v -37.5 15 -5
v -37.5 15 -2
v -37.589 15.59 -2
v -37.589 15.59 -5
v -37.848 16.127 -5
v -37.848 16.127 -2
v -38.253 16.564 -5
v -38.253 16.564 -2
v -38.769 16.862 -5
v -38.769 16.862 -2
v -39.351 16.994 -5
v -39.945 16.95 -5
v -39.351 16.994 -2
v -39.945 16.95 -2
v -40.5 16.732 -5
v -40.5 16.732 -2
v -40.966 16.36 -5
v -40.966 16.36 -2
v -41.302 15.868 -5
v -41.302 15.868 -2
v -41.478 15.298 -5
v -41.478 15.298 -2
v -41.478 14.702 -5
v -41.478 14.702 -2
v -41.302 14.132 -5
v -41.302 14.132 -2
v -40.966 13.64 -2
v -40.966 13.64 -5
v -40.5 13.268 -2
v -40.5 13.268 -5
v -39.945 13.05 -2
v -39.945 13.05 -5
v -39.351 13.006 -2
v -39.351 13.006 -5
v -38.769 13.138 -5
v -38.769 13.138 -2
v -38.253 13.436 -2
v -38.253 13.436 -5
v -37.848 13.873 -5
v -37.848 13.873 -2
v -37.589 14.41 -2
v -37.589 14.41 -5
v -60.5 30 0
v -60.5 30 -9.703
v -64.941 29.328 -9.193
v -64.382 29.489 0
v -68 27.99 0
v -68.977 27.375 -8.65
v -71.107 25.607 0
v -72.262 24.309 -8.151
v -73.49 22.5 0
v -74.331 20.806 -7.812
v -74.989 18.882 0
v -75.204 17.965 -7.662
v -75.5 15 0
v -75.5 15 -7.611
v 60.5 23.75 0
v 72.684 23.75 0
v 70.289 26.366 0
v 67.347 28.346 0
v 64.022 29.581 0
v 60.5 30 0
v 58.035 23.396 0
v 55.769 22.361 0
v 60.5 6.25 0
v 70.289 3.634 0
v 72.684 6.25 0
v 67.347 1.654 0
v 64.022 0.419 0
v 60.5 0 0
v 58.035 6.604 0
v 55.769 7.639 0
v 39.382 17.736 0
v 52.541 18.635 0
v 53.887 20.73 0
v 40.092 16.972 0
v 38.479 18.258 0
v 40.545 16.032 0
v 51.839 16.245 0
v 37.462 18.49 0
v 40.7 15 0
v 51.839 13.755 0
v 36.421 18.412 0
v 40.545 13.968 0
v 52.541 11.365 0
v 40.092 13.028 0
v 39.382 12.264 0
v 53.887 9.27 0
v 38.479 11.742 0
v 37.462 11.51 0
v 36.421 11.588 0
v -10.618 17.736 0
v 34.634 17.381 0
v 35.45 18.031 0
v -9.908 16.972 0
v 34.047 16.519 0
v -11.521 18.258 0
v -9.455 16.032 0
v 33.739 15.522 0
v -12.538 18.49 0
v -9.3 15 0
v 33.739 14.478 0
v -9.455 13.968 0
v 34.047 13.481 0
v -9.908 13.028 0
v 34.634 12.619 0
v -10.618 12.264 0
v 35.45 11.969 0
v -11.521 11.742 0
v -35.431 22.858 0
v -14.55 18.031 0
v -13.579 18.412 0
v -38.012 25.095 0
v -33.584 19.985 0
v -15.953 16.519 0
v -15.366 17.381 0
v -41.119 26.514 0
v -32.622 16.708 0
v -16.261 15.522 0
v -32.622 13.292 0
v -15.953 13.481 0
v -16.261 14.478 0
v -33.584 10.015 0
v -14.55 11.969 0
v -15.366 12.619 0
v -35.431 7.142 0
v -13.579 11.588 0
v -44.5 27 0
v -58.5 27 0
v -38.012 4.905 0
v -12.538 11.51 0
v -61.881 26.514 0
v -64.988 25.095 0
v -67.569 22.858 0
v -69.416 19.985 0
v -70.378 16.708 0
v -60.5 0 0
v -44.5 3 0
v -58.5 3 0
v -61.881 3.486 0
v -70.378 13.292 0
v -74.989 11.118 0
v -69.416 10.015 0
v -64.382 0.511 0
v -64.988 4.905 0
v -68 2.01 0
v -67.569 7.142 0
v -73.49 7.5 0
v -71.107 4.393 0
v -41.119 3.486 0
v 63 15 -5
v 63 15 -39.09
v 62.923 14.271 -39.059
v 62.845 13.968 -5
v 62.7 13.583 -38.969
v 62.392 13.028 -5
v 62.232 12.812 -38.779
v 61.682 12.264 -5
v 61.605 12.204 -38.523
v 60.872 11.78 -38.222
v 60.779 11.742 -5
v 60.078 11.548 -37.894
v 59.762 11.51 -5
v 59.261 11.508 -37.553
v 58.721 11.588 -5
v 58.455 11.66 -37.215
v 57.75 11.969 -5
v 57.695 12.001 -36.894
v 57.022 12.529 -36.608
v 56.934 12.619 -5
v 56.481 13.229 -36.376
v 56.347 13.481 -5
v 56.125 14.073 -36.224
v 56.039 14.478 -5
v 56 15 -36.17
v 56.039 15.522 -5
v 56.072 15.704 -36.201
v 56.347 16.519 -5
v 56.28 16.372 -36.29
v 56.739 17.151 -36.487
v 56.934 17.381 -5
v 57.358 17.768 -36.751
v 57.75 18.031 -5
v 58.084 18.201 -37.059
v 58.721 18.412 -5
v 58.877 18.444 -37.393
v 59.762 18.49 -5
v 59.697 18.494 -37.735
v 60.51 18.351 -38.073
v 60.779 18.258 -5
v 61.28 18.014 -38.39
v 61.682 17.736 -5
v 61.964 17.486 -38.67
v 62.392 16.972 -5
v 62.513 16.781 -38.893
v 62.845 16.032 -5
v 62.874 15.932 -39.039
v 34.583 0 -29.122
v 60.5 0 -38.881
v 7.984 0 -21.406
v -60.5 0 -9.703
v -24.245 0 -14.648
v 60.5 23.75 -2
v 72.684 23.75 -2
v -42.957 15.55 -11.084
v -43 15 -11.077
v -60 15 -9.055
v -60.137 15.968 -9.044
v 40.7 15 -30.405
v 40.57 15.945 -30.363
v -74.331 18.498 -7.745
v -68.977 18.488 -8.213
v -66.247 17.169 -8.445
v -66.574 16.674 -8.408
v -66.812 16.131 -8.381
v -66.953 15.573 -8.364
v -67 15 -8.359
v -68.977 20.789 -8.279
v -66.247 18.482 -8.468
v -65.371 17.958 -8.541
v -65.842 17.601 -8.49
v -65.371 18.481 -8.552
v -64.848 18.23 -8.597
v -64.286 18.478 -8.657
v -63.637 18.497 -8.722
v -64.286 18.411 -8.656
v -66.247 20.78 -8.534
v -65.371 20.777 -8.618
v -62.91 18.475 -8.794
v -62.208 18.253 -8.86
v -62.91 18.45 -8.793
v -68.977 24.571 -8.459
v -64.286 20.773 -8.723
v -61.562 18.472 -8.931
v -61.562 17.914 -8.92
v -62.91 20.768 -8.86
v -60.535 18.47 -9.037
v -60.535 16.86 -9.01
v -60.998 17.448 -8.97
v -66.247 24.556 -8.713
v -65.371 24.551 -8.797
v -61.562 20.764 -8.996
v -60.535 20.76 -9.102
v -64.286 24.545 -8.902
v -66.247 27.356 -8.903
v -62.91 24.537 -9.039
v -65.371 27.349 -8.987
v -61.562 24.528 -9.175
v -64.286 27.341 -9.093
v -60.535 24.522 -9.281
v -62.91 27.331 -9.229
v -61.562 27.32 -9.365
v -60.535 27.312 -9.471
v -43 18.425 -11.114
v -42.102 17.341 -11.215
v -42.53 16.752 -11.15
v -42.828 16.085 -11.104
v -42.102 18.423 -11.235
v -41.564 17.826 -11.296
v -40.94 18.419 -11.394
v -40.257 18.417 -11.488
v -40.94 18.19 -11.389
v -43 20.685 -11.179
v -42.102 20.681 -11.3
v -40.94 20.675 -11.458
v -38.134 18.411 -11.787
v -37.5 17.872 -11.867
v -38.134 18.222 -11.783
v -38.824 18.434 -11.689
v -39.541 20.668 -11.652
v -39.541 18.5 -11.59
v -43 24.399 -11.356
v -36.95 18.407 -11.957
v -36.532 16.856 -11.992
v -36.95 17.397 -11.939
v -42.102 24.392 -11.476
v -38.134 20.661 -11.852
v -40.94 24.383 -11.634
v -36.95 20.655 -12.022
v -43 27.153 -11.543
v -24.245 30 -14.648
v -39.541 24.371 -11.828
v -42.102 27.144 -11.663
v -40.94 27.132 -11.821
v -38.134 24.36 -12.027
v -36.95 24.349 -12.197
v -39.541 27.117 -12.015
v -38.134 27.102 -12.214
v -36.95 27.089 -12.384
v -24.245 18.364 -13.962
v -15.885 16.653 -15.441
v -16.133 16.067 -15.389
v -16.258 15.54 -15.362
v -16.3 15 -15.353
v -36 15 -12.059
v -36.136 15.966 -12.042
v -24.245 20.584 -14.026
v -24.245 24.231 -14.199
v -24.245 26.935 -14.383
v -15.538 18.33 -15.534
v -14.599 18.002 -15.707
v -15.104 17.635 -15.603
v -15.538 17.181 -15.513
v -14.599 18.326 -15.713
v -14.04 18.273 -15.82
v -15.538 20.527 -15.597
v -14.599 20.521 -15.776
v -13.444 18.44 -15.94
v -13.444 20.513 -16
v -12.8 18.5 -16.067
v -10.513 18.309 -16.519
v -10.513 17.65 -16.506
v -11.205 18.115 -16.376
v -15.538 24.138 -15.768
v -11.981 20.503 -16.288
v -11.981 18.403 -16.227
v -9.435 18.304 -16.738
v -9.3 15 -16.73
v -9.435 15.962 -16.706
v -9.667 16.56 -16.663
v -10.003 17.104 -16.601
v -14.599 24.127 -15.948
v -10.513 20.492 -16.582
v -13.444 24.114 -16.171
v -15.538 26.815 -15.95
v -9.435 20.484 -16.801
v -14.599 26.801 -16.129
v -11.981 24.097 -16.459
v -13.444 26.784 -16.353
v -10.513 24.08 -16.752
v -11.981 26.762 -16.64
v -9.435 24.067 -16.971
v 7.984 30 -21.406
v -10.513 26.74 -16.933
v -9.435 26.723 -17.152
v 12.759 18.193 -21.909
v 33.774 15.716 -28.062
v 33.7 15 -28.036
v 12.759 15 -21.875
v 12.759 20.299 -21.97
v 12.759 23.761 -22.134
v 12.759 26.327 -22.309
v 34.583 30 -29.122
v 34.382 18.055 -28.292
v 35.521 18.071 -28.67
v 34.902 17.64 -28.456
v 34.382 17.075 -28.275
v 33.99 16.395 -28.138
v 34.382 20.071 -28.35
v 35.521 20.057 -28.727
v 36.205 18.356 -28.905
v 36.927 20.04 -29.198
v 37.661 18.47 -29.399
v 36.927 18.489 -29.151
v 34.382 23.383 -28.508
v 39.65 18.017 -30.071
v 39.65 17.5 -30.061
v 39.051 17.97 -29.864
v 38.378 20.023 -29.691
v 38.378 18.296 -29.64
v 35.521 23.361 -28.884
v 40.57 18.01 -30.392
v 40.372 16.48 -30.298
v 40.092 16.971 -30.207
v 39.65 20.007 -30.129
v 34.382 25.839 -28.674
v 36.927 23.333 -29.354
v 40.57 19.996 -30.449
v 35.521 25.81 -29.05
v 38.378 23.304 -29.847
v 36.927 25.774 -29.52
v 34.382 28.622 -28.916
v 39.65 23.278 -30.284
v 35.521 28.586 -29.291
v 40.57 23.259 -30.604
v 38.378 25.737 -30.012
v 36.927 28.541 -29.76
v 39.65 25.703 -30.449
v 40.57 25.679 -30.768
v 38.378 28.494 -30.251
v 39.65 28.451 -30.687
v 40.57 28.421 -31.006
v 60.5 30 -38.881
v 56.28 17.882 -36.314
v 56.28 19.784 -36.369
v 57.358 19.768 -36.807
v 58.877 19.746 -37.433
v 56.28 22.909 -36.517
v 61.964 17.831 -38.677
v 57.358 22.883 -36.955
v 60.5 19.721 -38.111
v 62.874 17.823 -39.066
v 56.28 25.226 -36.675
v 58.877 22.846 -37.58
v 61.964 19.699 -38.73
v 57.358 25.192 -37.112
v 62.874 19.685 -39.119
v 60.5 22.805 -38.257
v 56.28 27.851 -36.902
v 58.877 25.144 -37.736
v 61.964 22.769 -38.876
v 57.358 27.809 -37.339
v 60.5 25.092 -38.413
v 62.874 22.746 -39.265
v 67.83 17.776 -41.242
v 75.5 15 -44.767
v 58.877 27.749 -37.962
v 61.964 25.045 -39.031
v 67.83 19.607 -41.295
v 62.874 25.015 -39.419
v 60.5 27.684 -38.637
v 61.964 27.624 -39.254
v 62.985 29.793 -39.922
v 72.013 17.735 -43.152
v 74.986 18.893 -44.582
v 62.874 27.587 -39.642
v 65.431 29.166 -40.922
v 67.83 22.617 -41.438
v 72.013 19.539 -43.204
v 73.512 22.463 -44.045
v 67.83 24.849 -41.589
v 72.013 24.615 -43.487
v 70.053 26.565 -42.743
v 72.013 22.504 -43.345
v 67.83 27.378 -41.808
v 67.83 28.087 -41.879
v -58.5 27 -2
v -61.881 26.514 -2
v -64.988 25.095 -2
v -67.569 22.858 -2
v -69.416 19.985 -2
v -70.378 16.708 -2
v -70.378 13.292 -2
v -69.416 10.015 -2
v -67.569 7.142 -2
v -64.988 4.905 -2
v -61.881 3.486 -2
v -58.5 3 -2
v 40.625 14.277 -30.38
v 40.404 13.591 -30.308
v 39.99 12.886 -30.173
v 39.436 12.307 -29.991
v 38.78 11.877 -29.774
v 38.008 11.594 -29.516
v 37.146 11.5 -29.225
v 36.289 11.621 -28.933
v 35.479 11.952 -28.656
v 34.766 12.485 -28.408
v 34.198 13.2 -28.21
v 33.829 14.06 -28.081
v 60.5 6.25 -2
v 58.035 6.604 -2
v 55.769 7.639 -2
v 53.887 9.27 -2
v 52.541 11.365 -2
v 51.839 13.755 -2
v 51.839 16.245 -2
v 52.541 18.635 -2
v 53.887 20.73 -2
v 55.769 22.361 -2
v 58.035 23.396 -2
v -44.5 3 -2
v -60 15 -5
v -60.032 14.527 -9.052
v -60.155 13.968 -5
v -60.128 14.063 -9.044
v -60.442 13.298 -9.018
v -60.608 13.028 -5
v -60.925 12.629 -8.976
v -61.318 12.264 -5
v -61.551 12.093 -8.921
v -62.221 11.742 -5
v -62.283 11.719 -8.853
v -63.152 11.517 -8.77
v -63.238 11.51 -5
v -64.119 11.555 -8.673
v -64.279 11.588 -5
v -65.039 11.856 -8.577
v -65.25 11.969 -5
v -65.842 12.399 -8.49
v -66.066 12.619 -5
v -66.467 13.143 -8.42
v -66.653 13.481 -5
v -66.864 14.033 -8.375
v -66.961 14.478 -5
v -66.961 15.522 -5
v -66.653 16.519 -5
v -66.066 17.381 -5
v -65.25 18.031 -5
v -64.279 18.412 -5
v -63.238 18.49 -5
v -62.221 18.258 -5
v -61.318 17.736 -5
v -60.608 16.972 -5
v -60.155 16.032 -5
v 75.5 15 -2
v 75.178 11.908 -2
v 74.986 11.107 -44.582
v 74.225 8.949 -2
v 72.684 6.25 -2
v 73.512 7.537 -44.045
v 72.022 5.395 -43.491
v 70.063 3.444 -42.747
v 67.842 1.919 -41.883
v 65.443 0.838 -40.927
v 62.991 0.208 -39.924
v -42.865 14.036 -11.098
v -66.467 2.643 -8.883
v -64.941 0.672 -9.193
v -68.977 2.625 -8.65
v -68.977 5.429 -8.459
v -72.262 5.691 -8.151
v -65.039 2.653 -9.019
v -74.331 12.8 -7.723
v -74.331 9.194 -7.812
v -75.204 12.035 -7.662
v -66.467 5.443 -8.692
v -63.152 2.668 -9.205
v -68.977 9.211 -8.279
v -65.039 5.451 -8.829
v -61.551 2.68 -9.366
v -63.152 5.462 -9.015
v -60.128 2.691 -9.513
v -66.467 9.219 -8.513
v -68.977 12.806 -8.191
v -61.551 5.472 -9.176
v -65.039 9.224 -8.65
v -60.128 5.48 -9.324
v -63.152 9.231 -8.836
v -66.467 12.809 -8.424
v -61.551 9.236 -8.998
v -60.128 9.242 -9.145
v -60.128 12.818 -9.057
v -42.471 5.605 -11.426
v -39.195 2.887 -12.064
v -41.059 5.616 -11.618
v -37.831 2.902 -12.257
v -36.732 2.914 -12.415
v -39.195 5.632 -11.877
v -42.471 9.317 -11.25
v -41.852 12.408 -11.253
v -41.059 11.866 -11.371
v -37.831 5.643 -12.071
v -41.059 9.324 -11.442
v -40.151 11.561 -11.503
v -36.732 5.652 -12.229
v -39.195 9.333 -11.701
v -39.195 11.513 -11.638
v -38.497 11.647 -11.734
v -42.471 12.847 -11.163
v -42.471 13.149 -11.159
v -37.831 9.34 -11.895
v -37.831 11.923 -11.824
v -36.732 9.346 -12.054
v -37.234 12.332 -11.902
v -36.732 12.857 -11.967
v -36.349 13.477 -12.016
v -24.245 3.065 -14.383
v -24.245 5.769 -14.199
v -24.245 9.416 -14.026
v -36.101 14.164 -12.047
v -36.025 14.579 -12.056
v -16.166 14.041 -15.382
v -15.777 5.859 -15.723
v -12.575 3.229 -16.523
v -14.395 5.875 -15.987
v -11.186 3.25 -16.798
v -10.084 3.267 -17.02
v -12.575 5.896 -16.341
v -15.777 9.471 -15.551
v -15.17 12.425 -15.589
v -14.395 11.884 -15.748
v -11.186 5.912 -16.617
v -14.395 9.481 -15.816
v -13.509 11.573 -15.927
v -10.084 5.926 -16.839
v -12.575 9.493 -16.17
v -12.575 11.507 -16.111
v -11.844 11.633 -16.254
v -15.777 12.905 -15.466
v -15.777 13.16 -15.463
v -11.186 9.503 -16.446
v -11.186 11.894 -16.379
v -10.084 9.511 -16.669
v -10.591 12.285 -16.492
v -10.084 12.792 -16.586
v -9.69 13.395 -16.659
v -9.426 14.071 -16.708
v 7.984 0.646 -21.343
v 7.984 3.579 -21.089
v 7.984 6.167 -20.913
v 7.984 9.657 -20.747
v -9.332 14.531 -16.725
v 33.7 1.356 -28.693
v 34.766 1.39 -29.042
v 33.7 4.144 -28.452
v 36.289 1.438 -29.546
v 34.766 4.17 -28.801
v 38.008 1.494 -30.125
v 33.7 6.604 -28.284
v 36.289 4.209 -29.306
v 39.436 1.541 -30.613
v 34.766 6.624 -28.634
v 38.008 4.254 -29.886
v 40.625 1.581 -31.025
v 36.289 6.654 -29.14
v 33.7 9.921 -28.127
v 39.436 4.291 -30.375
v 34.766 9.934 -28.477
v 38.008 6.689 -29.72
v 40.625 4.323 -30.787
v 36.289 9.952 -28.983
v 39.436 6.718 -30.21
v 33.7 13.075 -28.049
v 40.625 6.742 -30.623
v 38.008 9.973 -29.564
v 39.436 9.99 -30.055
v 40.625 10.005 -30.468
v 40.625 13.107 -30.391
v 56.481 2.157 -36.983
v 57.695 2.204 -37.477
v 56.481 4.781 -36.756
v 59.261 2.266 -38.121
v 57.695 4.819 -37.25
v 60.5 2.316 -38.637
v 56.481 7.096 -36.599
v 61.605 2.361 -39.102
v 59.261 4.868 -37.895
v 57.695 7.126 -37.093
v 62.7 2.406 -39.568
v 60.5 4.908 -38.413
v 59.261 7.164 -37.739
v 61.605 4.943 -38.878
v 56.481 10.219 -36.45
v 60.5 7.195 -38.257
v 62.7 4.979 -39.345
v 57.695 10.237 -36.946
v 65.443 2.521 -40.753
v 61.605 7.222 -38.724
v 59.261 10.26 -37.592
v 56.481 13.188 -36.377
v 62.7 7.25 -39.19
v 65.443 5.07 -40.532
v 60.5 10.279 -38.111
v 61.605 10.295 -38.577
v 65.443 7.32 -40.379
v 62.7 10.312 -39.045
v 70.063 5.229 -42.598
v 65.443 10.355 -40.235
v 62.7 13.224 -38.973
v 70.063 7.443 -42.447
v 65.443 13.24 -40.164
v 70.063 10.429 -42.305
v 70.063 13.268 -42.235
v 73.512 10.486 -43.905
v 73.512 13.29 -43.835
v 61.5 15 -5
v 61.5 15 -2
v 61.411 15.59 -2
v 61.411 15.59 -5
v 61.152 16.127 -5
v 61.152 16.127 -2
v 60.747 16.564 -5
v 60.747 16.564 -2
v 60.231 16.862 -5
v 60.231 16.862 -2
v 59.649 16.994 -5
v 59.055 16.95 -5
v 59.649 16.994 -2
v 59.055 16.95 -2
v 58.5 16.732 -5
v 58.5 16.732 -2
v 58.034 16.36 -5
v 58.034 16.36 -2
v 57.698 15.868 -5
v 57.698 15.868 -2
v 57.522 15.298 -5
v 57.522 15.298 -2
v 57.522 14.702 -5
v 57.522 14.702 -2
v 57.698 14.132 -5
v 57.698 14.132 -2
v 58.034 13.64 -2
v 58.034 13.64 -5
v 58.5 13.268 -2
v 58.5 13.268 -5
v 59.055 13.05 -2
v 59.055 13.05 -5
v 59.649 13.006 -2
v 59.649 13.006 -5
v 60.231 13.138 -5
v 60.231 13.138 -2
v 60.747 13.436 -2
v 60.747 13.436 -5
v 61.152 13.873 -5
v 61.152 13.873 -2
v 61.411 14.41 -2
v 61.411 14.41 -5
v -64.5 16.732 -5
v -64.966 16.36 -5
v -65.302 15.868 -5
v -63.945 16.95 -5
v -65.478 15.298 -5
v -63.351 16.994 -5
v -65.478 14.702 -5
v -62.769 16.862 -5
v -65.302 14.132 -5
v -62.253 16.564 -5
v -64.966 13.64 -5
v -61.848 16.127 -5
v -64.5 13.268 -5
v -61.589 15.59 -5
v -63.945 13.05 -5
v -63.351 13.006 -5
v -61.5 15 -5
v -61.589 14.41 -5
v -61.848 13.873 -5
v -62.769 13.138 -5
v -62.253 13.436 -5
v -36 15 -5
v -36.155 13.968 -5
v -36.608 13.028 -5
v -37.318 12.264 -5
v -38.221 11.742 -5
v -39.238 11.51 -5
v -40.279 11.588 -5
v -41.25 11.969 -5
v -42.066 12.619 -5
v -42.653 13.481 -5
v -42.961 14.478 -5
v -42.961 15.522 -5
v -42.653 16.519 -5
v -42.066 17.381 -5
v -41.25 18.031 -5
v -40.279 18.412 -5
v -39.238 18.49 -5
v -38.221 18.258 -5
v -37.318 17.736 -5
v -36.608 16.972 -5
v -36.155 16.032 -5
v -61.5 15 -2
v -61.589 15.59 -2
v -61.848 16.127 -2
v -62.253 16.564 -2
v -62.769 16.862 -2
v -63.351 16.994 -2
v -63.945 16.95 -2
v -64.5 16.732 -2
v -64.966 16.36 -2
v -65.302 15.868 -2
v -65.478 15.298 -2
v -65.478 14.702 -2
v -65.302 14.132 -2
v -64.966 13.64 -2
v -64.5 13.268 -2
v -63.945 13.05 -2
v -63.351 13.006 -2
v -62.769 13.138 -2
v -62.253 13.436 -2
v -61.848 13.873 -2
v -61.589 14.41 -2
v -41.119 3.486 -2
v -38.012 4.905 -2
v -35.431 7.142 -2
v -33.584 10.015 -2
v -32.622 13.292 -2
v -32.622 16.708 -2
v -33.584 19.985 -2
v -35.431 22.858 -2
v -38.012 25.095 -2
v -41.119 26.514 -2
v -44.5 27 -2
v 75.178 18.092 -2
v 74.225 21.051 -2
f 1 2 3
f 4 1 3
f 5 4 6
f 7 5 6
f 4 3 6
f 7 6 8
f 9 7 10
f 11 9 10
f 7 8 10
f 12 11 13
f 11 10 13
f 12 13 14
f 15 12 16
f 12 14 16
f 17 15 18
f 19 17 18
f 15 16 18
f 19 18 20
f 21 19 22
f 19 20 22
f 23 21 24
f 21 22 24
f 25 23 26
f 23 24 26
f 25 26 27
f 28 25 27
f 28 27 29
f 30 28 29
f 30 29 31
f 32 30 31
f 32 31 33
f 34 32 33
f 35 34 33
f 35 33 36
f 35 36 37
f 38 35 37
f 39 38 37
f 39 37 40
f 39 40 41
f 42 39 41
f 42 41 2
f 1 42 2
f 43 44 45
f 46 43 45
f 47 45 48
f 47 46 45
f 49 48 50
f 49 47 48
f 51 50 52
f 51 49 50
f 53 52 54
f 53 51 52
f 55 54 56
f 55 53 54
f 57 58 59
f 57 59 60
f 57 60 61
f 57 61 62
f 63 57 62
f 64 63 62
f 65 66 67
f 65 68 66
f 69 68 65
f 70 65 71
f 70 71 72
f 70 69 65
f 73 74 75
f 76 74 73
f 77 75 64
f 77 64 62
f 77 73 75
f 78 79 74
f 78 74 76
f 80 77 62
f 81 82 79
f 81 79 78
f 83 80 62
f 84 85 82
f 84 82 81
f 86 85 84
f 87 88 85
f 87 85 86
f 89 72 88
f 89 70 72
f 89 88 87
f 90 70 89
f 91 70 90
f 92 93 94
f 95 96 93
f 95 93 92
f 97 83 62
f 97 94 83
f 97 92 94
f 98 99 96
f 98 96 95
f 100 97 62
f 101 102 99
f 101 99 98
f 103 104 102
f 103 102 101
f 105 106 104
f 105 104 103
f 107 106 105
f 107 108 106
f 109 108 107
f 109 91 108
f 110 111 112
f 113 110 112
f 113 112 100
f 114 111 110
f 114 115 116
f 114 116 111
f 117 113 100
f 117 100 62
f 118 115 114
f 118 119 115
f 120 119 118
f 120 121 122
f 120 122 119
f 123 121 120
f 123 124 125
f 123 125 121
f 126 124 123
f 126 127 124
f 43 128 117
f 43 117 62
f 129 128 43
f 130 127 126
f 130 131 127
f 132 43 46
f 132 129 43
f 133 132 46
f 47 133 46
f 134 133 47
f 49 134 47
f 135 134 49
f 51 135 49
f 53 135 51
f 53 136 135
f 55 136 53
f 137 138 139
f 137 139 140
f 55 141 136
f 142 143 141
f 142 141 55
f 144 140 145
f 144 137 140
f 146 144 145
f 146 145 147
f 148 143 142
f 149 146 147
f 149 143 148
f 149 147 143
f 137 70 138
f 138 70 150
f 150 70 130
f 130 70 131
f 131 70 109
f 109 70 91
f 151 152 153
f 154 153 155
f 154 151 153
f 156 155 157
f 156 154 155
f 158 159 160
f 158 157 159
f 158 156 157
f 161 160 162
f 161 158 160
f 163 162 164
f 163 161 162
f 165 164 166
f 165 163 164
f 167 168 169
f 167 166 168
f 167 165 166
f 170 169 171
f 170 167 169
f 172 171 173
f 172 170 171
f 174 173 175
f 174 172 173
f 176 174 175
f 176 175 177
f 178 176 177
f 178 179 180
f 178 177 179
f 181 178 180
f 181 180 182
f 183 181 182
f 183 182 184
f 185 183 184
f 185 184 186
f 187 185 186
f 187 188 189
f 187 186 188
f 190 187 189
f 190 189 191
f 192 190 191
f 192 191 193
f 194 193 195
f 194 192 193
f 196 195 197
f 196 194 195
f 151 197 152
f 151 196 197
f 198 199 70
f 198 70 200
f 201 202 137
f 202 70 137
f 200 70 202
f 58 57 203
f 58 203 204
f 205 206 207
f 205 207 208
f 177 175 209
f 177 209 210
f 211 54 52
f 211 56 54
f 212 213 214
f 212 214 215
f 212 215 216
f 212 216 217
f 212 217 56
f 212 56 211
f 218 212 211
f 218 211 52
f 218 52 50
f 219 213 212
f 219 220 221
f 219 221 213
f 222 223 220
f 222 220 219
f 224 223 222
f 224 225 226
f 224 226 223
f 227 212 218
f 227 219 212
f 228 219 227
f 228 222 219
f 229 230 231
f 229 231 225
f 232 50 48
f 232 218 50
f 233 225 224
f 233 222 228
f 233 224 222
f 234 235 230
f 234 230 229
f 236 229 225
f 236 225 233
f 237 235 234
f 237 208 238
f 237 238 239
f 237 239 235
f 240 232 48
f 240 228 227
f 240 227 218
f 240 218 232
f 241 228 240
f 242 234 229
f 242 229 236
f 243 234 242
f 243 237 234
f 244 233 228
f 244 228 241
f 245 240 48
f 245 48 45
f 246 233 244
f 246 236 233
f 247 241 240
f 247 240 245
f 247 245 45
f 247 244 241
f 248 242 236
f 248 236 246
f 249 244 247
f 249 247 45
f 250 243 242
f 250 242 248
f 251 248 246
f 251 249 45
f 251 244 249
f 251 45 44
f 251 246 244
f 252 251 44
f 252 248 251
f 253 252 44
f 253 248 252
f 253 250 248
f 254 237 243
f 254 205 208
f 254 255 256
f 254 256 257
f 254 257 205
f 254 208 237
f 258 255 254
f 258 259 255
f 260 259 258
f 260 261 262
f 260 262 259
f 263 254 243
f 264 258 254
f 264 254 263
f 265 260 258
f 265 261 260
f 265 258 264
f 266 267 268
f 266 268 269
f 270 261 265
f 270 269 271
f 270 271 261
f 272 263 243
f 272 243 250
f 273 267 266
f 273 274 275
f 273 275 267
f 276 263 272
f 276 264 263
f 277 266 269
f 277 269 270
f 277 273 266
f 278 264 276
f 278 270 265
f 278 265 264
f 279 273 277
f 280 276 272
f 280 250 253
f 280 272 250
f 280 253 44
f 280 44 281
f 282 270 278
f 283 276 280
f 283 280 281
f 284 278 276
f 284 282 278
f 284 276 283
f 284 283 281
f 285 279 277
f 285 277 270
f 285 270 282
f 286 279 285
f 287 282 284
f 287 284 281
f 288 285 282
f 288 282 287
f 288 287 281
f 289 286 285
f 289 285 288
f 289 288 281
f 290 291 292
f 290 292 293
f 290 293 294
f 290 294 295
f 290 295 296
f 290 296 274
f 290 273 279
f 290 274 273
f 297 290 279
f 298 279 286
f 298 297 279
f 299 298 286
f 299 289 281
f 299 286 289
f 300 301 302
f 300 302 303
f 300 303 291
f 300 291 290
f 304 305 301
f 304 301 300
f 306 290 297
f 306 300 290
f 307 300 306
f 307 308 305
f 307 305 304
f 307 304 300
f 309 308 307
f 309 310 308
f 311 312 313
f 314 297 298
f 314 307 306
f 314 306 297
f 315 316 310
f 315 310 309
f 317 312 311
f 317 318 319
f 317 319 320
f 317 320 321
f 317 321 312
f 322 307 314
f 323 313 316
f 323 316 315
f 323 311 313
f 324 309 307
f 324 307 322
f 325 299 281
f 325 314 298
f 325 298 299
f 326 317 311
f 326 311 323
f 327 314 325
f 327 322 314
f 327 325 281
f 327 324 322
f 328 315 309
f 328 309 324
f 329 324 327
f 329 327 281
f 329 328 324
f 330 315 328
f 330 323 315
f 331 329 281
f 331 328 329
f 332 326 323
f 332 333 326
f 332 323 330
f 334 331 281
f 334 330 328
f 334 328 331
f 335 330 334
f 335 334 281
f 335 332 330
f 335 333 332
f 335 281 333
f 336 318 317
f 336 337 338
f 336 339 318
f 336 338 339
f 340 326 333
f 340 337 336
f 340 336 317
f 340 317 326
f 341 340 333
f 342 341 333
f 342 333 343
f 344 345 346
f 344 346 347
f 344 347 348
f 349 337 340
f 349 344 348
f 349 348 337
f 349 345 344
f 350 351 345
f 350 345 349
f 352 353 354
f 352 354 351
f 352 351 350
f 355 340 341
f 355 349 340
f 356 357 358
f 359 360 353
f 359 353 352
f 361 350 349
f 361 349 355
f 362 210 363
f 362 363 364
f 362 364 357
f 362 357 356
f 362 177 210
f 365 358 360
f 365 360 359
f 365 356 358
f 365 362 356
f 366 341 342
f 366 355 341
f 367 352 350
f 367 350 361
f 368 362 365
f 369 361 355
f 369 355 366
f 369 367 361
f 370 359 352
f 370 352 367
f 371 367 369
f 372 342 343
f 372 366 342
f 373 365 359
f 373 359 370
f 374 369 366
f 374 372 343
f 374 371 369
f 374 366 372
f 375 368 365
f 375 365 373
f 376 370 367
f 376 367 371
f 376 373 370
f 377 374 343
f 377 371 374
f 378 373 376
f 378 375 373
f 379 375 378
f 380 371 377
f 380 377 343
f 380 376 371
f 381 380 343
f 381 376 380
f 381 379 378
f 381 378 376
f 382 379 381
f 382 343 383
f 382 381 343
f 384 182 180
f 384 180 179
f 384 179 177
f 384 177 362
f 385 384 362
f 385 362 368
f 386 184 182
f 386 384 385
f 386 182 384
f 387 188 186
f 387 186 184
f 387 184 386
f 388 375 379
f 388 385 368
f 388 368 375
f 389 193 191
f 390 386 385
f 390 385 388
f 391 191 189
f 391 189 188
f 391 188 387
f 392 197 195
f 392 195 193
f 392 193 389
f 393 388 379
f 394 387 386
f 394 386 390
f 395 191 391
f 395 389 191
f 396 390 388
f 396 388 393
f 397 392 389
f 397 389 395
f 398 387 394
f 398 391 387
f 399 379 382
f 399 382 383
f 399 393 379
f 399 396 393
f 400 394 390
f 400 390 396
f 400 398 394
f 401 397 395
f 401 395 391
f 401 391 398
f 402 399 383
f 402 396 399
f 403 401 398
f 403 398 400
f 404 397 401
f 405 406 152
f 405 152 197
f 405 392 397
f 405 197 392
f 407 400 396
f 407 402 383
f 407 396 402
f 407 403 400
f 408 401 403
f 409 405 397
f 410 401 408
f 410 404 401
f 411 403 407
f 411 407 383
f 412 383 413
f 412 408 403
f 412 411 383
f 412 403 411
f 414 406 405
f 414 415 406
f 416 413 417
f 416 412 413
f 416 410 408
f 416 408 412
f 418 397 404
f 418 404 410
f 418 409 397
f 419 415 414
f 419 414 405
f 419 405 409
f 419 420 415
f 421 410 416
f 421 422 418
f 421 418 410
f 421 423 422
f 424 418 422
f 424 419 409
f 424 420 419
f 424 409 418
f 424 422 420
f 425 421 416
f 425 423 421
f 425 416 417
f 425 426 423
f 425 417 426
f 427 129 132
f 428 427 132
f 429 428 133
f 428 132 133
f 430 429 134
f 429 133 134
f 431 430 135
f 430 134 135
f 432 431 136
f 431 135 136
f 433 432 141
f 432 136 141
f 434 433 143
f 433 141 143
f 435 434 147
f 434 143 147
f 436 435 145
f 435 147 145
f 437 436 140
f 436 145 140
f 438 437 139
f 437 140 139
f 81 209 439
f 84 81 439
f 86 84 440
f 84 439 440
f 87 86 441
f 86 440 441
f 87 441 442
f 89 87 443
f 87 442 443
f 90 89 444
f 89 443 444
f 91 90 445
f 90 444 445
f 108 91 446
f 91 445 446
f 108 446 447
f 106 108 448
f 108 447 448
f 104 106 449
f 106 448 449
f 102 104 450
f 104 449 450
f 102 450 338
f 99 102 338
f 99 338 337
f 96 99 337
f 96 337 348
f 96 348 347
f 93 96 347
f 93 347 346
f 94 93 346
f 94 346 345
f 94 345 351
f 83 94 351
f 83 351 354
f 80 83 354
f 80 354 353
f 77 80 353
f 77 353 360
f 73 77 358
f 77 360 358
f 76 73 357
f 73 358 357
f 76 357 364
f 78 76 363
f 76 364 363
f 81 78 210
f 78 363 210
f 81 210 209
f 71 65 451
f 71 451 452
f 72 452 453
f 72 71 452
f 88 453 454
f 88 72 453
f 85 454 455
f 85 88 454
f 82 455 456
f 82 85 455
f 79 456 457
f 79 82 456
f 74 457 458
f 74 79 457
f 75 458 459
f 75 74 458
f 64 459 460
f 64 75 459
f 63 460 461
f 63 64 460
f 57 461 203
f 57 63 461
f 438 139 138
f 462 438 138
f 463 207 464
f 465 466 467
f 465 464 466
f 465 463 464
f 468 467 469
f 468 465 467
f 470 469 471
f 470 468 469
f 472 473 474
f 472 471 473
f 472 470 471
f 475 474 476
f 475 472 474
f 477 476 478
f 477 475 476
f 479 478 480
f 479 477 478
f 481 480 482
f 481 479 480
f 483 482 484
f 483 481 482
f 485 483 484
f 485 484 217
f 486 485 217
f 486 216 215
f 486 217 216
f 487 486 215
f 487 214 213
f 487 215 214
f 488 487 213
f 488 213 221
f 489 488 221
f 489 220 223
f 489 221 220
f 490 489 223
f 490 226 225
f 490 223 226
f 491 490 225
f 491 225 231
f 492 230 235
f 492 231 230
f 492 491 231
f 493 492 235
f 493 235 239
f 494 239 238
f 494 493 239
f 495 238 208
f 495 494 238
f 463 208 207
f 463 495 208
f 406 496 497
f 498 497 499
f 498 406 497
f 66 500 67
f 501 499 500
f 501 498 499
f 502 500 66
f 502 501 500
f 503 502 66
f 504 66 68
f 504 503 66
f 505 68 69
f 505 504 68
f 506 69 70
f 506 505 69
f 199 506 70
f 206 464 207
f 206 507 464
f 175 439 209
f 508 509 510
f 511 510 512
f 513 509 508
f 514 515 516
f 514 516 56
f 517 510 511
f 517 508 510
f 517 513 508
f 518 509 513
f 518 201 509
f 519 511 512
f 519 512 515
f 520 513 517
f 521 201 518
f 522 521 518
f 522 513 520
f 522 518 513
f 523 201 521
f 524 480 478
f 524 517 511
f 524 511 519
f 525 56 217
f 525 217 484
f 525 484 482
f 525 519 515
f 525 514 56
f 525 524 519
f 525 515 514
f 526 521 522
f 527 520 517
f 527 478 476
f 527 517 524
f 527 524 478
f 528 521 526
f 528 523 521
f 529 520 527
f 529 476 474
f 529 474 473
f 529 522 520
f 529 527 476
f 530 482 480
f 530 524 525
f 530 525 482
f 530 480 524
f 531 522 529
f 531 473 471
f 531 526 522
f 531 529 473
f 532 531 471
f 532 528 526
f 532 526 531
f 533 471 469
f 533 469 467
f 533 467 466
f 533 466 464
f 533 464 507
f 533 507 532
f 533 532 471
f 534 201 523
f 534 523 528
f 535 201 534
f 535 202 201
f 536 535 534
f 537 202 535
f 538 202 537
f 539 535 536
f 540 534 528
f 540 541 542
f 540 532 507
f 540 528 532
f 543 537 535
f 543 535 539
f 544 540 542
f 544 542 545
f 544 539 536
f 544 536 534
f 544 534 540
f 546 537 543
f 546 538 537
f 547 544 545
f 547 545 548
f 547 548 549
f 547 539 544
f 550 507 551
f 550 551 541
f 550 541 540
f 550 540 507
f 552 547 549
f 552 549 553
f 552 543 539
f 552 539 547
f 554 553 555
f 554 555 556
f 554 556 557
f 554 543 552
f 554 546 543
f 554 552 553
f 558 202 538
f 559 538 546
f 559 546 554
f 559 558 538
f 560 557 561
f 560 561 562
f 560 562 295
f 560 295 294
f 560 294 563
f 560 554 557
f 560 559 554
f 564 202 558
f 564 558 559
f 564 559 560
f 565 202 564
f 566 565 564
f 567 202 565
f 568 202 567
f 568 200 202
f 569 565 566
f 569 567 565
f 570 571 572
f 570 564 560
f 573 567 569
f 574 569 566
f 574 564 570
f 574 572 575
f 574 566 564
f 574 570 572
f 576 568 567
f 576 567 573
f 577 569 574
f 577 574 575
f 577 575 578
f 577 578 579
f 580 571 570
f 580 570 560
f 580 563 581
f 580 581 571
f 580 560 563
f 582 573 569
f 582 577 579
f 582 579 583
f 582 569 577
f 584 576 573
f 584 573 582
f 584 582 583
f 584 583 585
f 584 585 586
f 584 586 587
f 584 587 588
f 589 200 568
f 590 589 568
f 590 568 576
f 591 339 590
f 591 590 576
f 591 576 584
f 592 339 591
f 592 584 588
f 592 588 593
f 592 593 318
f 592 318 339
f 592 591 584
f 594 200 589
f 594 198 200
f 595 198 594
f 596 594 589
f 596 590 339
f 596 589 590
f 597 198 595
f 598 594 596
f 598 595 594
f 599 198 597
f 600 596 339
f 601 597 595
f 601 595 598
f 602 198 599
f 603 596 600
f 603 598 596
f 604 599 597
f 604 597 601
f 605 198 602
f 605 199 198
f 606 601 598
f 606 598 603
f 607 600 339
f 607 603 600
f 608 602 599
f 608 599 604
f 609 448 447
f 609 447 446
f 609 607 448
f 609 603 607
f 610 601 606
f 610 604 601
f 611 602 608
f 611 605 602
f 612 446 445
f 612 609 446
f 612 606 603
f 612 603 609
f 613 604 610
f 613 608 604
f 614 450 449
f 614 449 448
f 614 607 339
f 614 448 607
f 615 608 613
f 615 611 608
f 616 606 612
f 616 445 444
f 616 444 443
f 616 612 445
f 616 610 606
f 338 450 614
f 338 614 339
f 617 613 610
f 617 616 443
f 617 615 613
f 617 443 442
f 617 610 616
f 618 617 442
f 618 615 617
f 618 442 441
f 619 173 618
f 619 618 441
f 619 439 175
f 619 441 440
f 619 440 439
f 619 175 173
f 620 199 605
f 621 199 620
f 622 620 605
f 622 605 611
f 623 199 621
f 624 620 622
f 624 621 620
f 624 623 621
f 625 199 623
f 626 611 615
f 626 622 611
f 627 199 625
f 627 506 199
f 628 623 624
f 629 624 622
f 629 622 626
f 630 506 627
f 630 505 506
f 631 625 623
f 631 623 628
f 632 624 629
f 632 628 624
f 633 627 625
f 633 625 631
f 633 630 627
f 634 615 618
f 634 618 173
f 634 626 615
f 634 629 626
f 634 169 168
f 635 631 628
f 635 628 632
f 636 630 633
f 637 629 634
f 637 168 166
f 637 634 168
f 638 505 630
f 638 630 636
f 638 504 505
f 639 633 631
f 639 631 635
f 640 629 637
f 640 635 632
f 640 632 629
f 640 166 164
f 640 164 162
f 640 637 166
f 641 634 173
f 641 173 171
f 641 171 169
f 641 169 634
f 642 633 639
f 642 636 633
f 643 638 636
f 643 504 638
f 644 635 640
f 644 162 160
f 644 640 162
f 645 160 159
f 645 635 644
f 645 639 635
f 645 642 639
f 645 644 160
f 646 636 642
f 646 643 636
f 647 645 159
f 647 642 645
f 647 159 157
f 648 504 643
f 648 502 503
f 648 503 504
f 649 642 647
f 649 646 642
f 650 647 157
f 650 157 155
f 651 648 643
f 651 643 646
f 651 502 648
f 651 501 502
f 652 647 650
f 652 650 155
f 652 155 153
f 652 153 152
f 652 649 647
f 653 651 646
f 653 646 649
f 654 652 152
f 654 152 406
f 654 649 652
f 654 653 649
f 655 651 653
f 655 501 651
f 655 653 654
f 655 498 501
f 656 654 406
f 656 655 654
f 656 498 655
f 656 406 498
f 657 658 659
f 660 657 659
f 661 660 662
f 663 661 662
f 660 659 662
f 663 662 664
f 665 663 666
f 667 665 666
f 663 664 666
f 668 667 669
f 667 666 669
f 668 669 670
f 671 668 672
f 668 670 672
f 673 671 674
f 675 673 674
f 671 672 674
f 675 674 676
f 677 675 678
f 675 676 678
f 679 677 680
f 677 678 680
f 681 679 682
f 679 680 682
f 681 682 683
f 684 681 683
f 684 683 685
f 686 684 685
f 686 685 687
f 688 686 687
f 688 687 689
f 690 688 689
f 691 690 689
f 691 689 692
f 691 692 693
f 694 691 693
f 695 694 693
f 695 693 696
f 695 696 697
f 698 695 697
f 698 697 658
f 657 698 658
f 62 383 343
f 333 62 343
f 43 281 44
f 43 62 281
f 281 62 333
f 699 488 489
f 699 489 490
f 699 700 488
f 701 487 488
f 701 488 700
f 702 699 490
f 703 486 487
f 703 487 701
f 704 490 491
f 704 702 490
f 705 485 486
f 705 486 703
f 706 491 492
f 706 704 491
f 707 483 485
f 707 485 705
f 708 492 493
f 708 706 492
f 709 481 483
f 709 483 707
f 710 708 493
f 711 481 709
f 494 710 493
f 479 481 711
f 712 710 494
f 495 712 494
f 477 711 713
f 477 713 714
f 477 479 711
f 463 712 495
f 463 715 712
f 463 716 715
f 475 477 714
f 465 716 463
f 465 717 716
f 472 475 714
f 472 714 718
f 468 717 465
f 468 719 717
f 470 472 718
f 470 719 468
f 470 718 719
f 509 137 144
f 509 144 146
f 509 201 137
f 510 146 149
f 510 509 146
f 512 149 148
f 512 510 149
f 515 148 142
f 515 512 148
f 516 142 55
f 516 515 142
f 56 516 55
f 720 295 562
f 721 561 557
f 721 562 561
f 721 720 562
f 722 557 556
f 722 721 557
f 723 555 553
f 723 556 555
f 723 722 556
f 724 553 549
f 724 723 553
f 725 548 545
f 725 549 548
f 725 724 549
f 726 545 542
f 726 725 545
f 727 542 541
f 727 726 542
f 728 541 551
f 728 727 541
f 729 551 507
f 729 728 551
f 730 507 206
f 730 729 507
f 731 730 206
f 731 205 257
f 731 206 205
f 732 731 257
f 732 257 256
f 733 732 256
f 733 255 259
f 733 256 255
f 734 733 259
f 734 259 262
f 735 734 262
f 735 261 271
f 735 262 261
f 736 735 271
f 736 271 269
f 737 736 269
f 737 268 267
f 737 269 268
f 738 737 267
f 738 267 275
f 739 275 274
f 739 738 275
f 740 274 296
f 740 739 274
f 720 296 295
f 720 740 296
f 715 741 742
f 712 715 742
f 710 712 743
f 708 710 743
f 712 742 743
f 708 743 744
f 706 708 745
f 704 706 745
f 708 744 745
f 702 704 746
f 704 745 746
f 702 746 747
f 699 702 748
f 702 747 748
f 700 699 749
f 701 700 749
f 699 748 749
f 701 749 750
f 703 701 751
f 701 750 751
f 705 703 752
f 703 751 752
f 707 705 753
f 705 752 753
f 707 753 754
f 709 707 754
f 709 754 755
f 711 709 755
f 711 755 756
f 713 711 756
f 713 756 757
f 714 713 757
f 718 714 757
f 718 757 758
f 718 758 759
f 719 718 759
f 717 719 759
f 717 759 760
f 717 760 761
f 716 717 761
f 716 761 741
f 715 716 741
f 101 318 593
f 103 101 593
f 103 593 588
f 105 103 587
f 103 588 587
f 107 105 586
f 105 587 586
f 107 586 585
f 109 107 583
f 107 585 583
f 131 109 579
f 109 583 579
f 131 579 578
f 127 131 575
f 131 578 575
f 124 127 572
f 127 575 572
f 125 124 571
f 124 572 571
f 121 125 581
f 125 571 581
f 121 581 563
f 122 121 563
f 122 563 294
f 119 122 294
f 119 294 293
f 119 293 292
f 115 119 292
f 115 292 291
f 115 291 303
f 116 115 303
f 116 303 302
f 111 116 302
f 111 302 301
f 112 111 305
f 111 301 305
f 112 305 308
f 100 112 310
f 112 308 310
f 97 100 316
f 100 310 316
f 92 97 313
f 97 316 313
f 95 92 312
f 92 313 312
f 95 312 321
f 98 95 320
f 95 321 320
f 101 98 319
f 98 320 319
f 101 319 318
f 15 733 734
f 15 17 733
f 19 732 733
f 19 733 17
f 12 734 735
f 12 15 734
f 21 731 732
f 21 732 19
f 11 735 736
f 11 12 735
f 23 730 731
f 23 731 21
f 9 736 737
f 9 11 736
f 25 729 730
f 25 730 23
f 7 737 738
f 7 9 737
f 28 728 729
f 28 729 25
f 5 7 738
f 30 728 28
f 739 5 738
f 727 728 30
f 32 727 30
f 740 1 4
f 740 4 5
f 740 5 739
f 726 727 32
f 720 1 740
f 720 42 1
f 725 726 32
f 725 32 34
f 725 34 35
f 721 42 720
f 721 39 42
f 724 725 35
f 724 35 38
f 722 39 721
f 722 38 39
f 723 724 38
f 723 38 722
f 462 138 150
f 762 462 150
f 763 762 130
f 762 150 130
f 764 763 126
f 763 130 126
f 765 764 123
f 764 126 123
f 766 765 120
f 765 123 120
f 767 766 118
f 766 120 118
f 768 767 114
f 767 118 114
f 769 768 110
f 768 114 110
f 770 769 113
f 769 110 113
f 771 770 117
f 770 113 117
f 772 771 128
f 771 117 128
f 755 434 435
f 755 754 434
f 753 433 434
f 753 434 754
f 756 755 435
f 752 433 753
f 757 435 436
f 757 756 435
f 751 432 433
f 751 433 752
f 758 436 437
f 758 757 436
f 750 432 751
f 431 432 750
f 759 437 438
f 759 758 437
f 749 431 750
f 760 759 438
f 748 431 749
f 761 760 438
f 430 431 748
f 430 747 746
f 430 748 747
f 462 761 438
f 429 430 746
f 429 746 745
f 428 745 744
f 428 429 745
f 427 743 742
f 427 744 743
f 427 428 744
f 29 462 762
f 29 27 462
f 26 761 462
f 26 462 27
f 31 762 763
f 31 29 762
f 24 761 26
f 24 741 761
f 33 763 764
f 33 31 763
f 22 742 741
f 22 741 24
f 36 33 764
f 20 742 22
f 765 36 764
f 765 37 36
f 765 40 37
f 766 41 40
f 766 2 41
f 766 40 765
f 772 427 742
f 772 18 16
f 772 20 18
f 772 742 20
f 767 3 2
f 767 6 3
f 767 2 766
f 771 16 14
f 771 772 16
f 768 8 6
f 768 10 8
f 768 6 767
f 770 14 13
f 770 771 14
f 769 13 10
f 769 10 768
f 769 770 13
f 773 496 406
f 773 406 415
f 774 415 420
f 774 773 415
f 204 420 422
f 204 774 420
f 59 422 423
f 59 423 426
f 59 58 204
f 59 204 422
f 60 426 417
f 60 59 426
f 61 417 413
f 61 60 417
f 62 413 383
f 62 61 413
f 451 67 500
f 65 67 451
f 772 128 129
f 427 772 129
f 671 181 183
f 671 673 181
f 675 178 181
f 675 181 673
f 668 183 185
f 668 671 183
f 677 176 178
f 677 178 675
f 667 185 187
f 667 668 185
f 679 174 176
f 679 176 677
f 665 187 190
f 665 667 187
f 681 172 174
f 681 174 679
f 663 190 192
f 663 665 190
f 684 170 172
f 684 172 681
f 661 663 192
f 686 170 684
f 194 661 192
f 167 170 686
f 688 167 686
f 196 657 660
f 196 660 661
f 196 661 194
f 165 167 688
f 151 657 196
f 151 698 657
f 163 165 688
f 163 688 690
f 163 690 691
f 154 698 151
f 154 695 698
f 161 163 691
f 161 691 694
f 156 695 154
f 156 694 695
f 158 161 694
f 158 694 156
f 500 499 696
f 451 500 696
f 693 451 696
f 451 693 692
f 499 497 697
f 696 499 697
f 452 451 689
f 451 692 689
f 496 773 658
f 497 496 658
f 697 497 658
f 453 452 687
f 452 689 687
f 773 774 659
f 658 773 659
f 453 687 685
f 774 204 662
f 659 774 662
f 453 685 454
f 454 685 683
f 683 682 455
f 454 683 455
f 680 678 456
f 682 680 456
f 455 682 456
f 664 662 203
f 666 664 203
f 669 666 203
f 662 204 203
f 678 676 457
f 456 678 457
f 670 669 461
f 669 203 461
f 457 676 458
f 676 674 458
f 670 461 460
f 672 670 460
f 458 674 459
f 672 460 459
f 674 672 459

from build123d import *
from build123d.topology import SkipClean

# Parameters (mm, degrees)
BOSS_EXTRUDE1_DEPTH      = 30
SKETCH10_W               = 151
SKETCH10_H               = 30
BOSS_EXTRUDE2_DEPTH      = 40
SKETCH2_R                = 2
CUT_EXTRUDE1_DEPTH       = 94.198193522
SKETCH2_6_R              = 2
CUT_EXTRUDE2_DEPTH       = 2
SKETCH2_7_R              = 2
CUT_EXTRUDE3_DEPTH       = 2
F_7_0_7_DIAMETER_HOLE1_D = 7
CUT_EXTRUDE5_START       = 5
SKETCH9_R                = 3.5
CUT_EXTRUDE5_DEPTH       = 89.198193522
FILLET1_R                = 15


with BuildPart() as part:
    # Sketch1 → Boss-Extrude1 (new body)
    with BuildSketch(Plane(origin=(0, 0, 0), x_dir=(1, 0, 0), z_dir=(0, 1, 0))):
        Polygon((-25.3, 7), (49.7, 7), (75.5, 7), (75.5, 0), (-75.5, 0), (-75.5, 7), align=None)
    extrude(amount=BOSS_EXTRUDE1_DEPTH)

    # Sketch10 → Boss-Extrude2 (add)
    with BuildSketch(Plane(origin=(0, 0, -7), x_dir=(-1, 0, 0), z_dir=(0, 0, -1))):
        with Locations((0, 15)):
            Rectangle(SKETCH10_W, SKETCH10_H)
    extrude(amount=BOSS_EXTRUDE2_DEPTH)

    # Sketch13 → Cut-Revolve1 (revolve, cut)
    with SkipClean():  # the faces are left unmerged after this step: merging them gives an invalid solid
        with BuildSketch(Plane(origin=(0, 15, 0), x_dir=(1, 0, 0), z_dir=(0, 1, 0))):
            with BuildLine():
                Line((213.057276424, 147.5), (-103.5, 147.5))
                Line((-103.5, 147.5), (-103.5, 5.807423347))
                add(Edge.make_bspline(
                    [(-103.5, 5.807423347), (-21.17006382, 9.777706594), (50.172186829, 25.996032335), (136.844602336, 80.345696305), (186.549339742, 122.894371989), (213.057276424, 147.5)],
                    knots=[0, 0, 0, 0, 0.647236276, 0.769471995, 1, 1, 1, 1], degree=3))
            make_face()
        revolve(axis=Axis((213.057276424, 15, -170), (-1, 0, 0)), mode=Mode.SUBTRACT)
    add(part.part.scale(1), mode=Mode.REPLACE)  # the faces are merged on a copy

    # Sketch2 → Cut-Extrude1 (cut, through all)
    with BuildSketch(Plane.XY):
        with Locations((-39.5, 15)):
            Circle(SKETCH2_R)
        with Locations((59.5, 15)):
            Circle(SKETCH2_R)
        with Locations((-63.5, 15)):
            Circle(SKETCH2_R)
    extrude(amount=-CUT_EXTRUDE1_DEPTH, mode=Mode.SUBTRACT)

    # Sketch2<6> → Cut-Extrude2 (cut)
    with BuildSketch(Plane.XY):
        with BuildLine():
            Line((-58.5, 3), (-44.5, 3))
            ThreePointArc((-44.5, 3), (-32.5, 15), (-44.5, 27))
            Line((-44.5, 27), (-58.5, 27))
            ThreePointArc((-58.5, 27), (-70.5, 15), (-58.5, 3))
        make_face()
        with Locations((-39.5, 15)):
            Circle(SKETCH2_6_R, mode=Mode.SUBTRACT)
        with Locations((-63.5, 15)):
            Circle(SKETCH2_6_R, mode=Mode.SUBTRACT)
    extrude(amount=-CUT_EXTRUDE2_DEPTH, mode=Mode.SUBTRACT)

    # Sketch2<7> → Cut-Extrude3 (cut)
    # profile 1 of 2: a face of its own
    with BuildSketch(Plane.XY):
        with BuildLine():
            Line((60.5, 23.75), (75.5, 23.75))
            Line((75.5, 23.75), (75.5, 6.25))
            Line((75.5, 6.25), (60.5, 6.25))
            ThreePointArc((60.5, 6.25), (51.75, 15), (60.5, 23.75))
        make_face()
        with Locations((59.5, 15)):
            Circle(SKETCH2_7_R, mode=Mode.SUBTRACT)
    # profile 2 of 2: a face of its own
    with BuildSketch(Plane.XY):
        with BuildLine():
            Line((-58.5, 27), (-44.5, 27))
            ThreePointArc((-44.5, 27), (-32.5, 15), (-44.5, 3))
            Line((-44.5, 3), (-58.5, 3))
            ThreePointArc((-58.5, 3), (-70.5, 15), (-58.5, 27))
        make_face()
        with Locations((-63.5, 15)):
            Circle(SKETCH2_7_R, mode=Mode.SUBTRACT)
        with Locations((-39.5, 15)):
            Circle(SKETCH2_7_R, mode=Mode.SUBTRACT)
    extrude(amount=-CUT_EXTRUDE3_DEPTH, mode=Mode.SUBTRACT)

    # Ø7.0 (7) Diameter Hole1 (through all)
    with Locations(Plane(origin=(0, 0, 0), x_dir=(-1, 0, 0), z_dir=(0, 0, 1))):
        with Locations((-37.2, -15), (12.8, -15)):
            Hole(F_7_0_7_DIAMETER_HOLE1_D / 2)

    # Sketch9 → Cut-Extrude5 (cut, through all)
    with BuildSketch(Plane(origin=(0, 0, 0), x_dir=(-1, 0, 0), z_dir=(0, 0, -1)).offset(CUT_EXTRUDE5_START)):
        with Locations(Location((-59.5, 15, 0), (0, 0, 180))):
            Circle(SKETCH9_R)
        with Locations(Location((39.5, 15, 0), (0, 0, 180))):
            Circle(SKETCH9_R)
        with Locations(Location((63.5, 15, 0), (0, 0, 180))):
            Circle(SKETCH9_R)
    extrude(amount=CUT_EXTRUDE5_DEPTH, mode=Mode.SUBTRACT)

    # Fillet1
    fillet1_edges = [part.edges().sort_by_distance(p)[0] for p in [
        (75.5, 30, -22.834476377),
        (-75.5, 0, -4.152504649),
        (75.5, 0, -22.834476377),
        (-75.5, 30, -4.152504649),
    ]]
    fillet(fillet1_edges, radius=FILLET1_R - 0.0001)  # a hair under: the kernel refuses the full size


solid = part.part
